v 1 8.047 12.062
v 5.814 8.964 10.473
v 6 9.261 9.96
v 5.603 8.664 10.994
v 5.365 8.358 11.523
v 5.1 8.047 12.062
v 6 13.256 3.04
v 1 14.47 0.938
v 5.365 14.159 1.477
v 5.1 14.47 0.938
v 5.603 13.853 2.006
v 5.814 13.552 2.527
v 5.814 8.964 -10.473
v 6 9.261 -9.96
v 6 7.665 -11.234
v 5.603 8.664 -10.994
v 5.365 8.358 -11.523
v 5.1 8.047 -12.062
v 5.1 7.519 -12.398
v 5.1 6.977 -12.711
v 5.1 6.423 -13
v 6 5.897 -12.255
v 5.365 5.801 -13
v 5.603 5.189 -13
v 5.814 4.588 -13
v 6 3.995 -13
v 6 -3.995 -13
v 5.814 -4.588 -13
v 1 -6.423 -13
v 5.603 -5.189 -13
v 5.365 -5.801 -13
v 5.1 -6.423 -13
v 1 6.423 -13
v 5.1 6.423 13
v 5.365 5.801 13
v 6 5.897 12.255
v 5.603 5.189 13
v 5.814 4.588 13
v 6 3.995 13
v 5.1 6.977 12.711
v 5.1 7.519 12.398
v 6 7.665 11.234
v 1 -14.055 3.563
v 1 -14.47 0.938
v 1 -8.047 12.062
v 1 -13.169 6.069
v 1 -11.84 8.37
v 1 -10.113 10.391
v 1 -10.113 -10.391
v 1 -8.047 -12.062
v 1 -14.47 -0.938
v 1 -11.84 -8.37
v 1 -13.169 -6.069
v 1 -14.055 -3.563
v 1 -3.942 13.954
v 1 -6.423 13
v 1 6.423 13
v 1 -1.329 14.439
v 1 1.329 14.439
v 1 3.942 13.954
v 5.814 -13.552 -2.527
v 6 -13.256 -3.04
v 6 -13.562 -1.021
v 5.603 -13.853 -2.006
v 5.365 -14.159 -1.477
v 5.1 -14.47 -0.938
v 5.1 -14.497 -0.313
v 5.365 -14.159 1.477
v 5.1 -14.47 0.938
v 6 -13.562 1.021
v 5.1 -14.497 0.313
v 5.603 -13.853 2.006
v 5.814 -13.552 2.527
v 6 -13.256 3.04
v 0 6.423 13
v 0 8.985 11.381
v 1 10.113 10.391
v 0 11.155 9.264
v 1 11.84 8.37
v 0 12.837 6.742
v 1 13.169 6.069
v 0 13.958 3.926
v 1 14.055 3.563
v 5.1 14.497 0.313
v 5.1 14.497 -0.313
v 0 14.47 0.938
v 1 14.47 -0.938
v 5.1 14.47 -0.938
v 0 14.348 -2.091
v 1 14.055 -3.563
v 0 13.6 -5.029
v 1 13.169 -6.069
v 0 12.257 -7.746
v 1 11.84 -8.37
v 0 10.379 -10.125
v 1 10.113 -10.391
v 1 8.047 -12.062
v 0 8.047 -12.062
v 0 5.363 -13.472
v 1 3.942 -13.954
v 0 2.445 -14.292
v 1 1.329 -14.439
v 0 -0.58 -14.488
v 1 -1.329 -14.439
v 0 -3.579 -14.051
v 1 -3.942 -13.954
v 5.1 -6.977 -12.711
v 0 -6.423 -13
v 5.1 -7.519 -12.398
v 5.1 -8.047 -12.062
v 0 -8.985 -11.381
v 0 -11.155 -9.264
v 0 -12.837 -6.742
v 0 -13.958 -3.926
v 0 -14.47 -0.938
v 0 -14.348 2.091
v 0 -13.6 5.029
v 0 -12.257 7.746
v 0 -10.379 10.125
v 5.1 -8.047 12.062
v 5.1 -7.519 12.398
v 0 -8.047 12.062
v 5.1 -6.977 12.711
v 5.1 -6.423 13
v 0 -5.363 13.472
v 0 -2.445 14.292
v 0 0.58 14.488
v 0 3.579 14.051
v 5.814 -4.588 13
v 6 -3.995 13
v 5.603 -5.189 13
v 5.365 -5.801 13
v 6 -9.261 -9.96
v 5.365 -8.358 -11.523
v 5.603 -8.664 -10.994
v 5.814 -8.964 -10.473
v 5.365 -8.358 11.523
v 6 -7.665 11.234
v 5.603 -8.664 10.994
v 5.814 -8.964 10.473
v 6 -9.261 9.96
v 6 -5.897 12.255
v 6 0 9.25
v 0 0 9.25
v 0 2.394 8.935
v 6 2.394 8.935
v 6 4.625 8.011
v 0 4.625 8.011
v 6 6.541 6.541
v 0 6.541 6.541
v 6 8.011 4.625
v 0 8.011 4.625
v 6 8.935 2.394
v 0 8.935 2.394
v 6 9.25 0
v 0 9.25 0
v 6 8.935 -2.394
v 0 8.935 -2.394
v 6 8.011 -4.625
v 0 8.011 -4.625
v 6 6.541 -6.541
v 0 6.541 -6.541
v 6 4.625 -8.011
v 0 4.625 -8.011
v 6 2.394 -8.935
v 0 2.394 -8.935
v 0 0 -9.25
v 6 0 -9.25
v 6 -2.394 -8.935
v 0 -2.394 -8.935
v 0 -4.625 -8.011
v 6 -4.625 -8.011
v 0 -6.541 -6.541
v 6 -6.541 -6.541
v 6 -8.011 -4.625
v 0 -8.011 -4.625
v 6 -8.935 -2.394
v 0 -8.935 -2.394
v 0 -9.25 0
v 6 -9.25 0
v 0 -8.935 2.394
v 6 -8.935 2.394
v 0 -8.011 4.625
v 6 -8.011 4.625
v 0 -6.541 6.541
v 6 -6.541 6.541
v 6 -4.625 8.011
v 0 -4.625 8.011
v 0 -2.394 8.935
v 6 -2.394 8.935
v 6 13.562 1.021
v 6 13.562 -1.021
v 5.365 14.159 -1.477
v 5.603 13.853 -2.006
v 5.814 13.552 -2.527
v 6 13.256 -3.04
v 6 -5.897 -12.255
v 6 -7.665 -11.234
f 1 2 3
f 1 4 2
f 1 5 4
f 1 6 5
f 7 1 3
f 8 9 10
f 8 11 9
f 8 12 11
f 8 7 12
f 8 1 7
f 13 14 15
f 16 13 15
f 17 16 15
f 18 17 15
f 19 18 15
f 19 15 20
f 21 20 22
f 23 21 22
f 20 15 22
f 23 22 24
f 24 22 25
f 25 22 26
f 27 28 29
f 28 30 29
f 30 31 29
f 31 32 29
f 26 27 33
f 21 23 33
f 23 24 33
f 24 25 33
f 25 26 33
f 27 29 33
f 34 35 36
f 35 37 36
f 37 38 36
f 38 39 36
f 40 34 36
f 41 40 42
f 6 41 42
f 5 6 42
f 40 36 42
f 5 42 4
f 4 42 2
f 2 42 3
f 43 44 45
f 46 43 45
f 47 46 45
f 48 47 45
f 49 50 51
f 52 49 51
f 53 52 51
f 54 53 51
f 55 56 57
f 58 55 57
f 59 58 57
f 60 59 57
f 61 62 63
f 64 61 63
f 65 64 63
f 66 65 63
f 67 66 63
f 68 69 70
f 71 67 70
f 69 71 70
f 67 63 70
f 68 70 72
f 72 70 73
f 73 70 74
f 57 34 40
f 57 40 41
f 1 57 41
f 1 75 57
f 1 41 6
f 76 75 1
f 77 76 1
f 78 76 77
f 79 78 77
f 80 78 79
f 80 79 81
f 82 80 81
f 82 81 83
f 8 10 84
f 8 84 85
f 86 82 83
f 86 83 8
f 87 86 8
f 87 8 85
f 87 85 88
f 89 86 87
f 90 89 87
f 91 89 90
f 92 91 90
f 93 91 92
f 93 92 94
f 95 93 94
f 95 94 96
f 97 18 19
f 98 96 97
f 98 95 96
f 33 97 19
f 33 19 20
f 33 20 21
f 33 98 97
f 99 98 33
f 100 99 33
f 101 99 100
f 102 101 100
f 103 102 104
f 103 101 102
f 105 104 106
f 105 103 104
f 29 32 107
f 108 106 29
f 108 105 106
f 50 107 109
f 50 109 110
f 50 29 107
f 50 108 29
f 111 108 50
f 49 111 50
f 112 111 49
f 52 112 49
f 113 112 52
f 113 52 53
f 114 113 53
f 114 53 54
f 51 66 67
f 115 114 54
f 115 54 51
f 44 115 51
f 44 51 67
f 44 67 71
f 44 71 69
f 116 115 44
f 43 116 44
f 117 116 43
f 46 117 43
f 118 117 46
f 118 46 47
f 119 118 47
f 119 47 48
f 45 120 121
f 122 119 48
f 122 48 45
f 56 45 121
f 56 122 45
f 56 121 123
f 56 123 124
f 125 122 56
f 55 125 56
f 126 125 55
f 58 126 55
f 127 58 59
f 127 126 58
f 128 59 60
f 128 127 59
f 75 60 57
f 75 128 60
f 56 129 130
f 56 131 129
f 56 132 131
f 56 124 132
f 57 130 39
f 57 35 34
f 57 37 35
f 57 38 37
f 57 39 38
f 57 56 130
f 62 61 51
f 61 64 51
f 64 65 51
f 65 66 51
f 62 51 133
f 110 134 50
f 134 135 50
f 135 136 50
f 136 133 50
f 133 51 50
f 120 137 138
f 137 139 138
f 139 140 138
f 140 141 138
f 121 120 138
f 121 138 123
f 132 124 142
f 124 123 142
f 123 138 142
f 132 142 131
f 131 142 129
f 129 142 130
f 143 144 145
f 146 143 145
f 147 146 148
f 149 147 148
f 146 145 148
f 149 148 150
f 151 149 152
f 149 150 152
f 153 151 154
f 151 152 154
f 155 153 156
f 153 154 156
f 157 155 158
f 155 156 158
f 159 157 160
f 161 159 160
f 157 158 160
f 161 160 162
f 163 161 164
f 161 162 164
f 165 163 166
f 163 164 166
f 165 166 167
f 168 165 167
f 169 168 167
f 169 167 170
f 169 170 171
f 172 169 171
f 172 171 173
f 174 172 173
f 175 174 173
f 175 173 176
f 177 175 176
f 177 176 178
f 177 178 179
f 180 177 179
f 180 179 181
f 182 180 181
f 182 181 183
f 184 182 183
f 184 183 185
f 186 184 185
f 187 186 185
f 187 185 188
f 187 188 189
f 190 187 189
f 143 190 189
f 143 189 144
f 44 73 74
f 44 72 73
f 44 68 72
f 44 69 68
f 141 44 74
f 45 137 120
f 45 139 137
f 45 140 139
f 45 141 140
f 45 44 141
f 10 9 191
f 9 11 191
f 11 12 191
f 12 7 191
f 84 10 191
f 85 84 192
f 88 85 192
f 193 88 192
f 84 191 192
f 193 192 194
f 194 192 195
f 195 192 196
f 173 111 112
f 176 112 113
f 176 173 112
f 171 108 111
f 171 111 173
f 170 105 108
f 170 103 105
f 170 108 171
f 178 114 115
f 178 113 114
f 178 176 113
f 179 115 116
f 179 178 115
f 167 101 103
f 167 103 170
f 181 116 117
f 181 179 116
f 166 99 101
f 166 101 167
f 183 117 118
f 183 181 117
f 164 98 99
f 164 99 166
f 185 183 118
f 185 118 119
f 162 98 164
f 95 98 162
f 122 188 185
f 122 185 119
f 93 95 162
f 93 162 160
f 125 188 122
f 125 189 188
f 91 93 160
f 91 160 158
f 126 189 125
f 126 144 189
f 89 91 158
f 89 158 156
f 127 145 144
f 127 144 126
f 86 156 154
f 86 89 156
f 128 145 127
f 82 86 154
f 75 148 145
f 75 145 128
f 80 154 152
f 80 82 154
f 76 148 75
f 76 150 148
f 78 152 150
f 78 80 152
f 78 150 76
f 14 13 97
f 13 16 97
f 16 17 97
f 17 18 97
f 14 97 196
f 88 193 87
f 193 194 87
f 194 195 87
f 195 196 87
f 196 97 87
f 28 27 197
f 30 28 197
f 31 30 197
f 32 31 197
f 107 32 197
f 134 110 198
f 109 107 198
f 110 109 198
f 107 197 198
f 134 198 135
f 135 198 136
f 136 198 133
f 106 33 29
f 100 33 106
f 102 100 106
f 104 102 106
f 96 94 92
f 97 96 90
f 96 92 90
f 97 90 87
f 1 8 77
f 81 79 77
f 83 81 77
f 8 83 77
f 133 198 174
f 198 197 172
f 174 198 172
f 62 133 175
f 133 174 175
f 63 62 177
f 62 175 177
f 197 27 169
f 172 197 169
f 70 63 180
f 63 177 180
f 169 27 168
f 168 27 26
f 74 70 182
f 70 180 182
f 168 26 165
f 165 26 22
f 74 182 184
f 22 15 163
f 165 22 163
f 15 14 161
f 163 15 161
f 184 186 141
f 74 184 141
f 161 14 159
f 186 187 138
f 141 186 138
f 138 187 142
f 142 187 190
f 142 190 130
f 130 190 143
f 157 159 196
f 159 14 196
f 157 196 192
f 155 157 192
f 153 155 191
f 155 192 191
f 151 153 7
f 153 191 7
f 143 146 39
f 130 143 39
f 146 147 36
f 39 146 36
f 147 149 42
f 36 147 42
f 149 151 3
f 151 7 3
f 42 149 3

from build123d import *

# Parameters (mm, degrees)
EXTRUDE_1_DEPTH     = 6
SKETCH_3_R          = 14.5
EXTRUDE_2_DEPTH     = 1
SKETCH_4_R          = 15.011106999
SKETCH_4_R_2        = 14.5
CUT_EXTRUDE_1_DEPTH = 22.715969546
SKETCH_5_R          = 9.25
CUT_EXTRUDE_2_DEPTH = 22.365860619


with BuildPart() as part:
    # Эскиз1 → Вытянуть1 (new body)
    with BuildSketch(Plane(origin=(0, 0, 0), x_dir=(0, 0, -1), z_dir=(1, 0, 0))):
        Polygon((0, 15.011106999), (0, -15.011106999), (-13, -7.505553499), (-13, 7.505553499), align=None)
        Polygon((13, 7.505553499), (0, 15.011106999), (0, -15.011106999), (13, -7.505553499), align=None)
    extrude(amount=EXTRUDE_1_DEPTH)

    # Эскиз3 → Вытянуть2 (add)
    with BuildSketch(Plane.ZY):
        Circle(SKETCH_3_R)
    extrude(amount=-EXTRUDE_2_DEPTH)

    # Эскиз4 → Вырез-Вытянуть1 (cut, through all)
    with BuildSketch(Plane.ZY):
        Circle(SKETCH_4_R)
        Circle(SKETCH_4_R_2, mode=Mode.SUBTRACT)
    extrude(amount=-CUT_EXTRUDE_1_DEPTH, mode=Mode.SUBTRACT)

    # Эскиз5 → Вырез-Вытянуть2 (cut, through all)
    with BuildSketch(Plane.ZY):
        Circle(SKETCH_5_R)
    extrude(amount=-CUT_EXTRUDE_2_DEPTH, mode=Mode.SUBTRACT)

    # Эскиз6 → Вырез-Повернуть1 (revolve, cut)
    with BuildSketch(Plane.XY, mode=Mode.PRIVATE) as cut_revolve_1_sk:
        Polygon((4.5, 15.1), (6, 13.6), (6, 15.1), align=None)
    revolve(cut_revolve_1_sk.sketch.rotate(Axis((6, 0, 0), (-1, 0, 0)), 270), axis=Axis((6, 0, 0), (-1, 0, 0)), mode=Mode.SUBTRACT)


solid = part.part
